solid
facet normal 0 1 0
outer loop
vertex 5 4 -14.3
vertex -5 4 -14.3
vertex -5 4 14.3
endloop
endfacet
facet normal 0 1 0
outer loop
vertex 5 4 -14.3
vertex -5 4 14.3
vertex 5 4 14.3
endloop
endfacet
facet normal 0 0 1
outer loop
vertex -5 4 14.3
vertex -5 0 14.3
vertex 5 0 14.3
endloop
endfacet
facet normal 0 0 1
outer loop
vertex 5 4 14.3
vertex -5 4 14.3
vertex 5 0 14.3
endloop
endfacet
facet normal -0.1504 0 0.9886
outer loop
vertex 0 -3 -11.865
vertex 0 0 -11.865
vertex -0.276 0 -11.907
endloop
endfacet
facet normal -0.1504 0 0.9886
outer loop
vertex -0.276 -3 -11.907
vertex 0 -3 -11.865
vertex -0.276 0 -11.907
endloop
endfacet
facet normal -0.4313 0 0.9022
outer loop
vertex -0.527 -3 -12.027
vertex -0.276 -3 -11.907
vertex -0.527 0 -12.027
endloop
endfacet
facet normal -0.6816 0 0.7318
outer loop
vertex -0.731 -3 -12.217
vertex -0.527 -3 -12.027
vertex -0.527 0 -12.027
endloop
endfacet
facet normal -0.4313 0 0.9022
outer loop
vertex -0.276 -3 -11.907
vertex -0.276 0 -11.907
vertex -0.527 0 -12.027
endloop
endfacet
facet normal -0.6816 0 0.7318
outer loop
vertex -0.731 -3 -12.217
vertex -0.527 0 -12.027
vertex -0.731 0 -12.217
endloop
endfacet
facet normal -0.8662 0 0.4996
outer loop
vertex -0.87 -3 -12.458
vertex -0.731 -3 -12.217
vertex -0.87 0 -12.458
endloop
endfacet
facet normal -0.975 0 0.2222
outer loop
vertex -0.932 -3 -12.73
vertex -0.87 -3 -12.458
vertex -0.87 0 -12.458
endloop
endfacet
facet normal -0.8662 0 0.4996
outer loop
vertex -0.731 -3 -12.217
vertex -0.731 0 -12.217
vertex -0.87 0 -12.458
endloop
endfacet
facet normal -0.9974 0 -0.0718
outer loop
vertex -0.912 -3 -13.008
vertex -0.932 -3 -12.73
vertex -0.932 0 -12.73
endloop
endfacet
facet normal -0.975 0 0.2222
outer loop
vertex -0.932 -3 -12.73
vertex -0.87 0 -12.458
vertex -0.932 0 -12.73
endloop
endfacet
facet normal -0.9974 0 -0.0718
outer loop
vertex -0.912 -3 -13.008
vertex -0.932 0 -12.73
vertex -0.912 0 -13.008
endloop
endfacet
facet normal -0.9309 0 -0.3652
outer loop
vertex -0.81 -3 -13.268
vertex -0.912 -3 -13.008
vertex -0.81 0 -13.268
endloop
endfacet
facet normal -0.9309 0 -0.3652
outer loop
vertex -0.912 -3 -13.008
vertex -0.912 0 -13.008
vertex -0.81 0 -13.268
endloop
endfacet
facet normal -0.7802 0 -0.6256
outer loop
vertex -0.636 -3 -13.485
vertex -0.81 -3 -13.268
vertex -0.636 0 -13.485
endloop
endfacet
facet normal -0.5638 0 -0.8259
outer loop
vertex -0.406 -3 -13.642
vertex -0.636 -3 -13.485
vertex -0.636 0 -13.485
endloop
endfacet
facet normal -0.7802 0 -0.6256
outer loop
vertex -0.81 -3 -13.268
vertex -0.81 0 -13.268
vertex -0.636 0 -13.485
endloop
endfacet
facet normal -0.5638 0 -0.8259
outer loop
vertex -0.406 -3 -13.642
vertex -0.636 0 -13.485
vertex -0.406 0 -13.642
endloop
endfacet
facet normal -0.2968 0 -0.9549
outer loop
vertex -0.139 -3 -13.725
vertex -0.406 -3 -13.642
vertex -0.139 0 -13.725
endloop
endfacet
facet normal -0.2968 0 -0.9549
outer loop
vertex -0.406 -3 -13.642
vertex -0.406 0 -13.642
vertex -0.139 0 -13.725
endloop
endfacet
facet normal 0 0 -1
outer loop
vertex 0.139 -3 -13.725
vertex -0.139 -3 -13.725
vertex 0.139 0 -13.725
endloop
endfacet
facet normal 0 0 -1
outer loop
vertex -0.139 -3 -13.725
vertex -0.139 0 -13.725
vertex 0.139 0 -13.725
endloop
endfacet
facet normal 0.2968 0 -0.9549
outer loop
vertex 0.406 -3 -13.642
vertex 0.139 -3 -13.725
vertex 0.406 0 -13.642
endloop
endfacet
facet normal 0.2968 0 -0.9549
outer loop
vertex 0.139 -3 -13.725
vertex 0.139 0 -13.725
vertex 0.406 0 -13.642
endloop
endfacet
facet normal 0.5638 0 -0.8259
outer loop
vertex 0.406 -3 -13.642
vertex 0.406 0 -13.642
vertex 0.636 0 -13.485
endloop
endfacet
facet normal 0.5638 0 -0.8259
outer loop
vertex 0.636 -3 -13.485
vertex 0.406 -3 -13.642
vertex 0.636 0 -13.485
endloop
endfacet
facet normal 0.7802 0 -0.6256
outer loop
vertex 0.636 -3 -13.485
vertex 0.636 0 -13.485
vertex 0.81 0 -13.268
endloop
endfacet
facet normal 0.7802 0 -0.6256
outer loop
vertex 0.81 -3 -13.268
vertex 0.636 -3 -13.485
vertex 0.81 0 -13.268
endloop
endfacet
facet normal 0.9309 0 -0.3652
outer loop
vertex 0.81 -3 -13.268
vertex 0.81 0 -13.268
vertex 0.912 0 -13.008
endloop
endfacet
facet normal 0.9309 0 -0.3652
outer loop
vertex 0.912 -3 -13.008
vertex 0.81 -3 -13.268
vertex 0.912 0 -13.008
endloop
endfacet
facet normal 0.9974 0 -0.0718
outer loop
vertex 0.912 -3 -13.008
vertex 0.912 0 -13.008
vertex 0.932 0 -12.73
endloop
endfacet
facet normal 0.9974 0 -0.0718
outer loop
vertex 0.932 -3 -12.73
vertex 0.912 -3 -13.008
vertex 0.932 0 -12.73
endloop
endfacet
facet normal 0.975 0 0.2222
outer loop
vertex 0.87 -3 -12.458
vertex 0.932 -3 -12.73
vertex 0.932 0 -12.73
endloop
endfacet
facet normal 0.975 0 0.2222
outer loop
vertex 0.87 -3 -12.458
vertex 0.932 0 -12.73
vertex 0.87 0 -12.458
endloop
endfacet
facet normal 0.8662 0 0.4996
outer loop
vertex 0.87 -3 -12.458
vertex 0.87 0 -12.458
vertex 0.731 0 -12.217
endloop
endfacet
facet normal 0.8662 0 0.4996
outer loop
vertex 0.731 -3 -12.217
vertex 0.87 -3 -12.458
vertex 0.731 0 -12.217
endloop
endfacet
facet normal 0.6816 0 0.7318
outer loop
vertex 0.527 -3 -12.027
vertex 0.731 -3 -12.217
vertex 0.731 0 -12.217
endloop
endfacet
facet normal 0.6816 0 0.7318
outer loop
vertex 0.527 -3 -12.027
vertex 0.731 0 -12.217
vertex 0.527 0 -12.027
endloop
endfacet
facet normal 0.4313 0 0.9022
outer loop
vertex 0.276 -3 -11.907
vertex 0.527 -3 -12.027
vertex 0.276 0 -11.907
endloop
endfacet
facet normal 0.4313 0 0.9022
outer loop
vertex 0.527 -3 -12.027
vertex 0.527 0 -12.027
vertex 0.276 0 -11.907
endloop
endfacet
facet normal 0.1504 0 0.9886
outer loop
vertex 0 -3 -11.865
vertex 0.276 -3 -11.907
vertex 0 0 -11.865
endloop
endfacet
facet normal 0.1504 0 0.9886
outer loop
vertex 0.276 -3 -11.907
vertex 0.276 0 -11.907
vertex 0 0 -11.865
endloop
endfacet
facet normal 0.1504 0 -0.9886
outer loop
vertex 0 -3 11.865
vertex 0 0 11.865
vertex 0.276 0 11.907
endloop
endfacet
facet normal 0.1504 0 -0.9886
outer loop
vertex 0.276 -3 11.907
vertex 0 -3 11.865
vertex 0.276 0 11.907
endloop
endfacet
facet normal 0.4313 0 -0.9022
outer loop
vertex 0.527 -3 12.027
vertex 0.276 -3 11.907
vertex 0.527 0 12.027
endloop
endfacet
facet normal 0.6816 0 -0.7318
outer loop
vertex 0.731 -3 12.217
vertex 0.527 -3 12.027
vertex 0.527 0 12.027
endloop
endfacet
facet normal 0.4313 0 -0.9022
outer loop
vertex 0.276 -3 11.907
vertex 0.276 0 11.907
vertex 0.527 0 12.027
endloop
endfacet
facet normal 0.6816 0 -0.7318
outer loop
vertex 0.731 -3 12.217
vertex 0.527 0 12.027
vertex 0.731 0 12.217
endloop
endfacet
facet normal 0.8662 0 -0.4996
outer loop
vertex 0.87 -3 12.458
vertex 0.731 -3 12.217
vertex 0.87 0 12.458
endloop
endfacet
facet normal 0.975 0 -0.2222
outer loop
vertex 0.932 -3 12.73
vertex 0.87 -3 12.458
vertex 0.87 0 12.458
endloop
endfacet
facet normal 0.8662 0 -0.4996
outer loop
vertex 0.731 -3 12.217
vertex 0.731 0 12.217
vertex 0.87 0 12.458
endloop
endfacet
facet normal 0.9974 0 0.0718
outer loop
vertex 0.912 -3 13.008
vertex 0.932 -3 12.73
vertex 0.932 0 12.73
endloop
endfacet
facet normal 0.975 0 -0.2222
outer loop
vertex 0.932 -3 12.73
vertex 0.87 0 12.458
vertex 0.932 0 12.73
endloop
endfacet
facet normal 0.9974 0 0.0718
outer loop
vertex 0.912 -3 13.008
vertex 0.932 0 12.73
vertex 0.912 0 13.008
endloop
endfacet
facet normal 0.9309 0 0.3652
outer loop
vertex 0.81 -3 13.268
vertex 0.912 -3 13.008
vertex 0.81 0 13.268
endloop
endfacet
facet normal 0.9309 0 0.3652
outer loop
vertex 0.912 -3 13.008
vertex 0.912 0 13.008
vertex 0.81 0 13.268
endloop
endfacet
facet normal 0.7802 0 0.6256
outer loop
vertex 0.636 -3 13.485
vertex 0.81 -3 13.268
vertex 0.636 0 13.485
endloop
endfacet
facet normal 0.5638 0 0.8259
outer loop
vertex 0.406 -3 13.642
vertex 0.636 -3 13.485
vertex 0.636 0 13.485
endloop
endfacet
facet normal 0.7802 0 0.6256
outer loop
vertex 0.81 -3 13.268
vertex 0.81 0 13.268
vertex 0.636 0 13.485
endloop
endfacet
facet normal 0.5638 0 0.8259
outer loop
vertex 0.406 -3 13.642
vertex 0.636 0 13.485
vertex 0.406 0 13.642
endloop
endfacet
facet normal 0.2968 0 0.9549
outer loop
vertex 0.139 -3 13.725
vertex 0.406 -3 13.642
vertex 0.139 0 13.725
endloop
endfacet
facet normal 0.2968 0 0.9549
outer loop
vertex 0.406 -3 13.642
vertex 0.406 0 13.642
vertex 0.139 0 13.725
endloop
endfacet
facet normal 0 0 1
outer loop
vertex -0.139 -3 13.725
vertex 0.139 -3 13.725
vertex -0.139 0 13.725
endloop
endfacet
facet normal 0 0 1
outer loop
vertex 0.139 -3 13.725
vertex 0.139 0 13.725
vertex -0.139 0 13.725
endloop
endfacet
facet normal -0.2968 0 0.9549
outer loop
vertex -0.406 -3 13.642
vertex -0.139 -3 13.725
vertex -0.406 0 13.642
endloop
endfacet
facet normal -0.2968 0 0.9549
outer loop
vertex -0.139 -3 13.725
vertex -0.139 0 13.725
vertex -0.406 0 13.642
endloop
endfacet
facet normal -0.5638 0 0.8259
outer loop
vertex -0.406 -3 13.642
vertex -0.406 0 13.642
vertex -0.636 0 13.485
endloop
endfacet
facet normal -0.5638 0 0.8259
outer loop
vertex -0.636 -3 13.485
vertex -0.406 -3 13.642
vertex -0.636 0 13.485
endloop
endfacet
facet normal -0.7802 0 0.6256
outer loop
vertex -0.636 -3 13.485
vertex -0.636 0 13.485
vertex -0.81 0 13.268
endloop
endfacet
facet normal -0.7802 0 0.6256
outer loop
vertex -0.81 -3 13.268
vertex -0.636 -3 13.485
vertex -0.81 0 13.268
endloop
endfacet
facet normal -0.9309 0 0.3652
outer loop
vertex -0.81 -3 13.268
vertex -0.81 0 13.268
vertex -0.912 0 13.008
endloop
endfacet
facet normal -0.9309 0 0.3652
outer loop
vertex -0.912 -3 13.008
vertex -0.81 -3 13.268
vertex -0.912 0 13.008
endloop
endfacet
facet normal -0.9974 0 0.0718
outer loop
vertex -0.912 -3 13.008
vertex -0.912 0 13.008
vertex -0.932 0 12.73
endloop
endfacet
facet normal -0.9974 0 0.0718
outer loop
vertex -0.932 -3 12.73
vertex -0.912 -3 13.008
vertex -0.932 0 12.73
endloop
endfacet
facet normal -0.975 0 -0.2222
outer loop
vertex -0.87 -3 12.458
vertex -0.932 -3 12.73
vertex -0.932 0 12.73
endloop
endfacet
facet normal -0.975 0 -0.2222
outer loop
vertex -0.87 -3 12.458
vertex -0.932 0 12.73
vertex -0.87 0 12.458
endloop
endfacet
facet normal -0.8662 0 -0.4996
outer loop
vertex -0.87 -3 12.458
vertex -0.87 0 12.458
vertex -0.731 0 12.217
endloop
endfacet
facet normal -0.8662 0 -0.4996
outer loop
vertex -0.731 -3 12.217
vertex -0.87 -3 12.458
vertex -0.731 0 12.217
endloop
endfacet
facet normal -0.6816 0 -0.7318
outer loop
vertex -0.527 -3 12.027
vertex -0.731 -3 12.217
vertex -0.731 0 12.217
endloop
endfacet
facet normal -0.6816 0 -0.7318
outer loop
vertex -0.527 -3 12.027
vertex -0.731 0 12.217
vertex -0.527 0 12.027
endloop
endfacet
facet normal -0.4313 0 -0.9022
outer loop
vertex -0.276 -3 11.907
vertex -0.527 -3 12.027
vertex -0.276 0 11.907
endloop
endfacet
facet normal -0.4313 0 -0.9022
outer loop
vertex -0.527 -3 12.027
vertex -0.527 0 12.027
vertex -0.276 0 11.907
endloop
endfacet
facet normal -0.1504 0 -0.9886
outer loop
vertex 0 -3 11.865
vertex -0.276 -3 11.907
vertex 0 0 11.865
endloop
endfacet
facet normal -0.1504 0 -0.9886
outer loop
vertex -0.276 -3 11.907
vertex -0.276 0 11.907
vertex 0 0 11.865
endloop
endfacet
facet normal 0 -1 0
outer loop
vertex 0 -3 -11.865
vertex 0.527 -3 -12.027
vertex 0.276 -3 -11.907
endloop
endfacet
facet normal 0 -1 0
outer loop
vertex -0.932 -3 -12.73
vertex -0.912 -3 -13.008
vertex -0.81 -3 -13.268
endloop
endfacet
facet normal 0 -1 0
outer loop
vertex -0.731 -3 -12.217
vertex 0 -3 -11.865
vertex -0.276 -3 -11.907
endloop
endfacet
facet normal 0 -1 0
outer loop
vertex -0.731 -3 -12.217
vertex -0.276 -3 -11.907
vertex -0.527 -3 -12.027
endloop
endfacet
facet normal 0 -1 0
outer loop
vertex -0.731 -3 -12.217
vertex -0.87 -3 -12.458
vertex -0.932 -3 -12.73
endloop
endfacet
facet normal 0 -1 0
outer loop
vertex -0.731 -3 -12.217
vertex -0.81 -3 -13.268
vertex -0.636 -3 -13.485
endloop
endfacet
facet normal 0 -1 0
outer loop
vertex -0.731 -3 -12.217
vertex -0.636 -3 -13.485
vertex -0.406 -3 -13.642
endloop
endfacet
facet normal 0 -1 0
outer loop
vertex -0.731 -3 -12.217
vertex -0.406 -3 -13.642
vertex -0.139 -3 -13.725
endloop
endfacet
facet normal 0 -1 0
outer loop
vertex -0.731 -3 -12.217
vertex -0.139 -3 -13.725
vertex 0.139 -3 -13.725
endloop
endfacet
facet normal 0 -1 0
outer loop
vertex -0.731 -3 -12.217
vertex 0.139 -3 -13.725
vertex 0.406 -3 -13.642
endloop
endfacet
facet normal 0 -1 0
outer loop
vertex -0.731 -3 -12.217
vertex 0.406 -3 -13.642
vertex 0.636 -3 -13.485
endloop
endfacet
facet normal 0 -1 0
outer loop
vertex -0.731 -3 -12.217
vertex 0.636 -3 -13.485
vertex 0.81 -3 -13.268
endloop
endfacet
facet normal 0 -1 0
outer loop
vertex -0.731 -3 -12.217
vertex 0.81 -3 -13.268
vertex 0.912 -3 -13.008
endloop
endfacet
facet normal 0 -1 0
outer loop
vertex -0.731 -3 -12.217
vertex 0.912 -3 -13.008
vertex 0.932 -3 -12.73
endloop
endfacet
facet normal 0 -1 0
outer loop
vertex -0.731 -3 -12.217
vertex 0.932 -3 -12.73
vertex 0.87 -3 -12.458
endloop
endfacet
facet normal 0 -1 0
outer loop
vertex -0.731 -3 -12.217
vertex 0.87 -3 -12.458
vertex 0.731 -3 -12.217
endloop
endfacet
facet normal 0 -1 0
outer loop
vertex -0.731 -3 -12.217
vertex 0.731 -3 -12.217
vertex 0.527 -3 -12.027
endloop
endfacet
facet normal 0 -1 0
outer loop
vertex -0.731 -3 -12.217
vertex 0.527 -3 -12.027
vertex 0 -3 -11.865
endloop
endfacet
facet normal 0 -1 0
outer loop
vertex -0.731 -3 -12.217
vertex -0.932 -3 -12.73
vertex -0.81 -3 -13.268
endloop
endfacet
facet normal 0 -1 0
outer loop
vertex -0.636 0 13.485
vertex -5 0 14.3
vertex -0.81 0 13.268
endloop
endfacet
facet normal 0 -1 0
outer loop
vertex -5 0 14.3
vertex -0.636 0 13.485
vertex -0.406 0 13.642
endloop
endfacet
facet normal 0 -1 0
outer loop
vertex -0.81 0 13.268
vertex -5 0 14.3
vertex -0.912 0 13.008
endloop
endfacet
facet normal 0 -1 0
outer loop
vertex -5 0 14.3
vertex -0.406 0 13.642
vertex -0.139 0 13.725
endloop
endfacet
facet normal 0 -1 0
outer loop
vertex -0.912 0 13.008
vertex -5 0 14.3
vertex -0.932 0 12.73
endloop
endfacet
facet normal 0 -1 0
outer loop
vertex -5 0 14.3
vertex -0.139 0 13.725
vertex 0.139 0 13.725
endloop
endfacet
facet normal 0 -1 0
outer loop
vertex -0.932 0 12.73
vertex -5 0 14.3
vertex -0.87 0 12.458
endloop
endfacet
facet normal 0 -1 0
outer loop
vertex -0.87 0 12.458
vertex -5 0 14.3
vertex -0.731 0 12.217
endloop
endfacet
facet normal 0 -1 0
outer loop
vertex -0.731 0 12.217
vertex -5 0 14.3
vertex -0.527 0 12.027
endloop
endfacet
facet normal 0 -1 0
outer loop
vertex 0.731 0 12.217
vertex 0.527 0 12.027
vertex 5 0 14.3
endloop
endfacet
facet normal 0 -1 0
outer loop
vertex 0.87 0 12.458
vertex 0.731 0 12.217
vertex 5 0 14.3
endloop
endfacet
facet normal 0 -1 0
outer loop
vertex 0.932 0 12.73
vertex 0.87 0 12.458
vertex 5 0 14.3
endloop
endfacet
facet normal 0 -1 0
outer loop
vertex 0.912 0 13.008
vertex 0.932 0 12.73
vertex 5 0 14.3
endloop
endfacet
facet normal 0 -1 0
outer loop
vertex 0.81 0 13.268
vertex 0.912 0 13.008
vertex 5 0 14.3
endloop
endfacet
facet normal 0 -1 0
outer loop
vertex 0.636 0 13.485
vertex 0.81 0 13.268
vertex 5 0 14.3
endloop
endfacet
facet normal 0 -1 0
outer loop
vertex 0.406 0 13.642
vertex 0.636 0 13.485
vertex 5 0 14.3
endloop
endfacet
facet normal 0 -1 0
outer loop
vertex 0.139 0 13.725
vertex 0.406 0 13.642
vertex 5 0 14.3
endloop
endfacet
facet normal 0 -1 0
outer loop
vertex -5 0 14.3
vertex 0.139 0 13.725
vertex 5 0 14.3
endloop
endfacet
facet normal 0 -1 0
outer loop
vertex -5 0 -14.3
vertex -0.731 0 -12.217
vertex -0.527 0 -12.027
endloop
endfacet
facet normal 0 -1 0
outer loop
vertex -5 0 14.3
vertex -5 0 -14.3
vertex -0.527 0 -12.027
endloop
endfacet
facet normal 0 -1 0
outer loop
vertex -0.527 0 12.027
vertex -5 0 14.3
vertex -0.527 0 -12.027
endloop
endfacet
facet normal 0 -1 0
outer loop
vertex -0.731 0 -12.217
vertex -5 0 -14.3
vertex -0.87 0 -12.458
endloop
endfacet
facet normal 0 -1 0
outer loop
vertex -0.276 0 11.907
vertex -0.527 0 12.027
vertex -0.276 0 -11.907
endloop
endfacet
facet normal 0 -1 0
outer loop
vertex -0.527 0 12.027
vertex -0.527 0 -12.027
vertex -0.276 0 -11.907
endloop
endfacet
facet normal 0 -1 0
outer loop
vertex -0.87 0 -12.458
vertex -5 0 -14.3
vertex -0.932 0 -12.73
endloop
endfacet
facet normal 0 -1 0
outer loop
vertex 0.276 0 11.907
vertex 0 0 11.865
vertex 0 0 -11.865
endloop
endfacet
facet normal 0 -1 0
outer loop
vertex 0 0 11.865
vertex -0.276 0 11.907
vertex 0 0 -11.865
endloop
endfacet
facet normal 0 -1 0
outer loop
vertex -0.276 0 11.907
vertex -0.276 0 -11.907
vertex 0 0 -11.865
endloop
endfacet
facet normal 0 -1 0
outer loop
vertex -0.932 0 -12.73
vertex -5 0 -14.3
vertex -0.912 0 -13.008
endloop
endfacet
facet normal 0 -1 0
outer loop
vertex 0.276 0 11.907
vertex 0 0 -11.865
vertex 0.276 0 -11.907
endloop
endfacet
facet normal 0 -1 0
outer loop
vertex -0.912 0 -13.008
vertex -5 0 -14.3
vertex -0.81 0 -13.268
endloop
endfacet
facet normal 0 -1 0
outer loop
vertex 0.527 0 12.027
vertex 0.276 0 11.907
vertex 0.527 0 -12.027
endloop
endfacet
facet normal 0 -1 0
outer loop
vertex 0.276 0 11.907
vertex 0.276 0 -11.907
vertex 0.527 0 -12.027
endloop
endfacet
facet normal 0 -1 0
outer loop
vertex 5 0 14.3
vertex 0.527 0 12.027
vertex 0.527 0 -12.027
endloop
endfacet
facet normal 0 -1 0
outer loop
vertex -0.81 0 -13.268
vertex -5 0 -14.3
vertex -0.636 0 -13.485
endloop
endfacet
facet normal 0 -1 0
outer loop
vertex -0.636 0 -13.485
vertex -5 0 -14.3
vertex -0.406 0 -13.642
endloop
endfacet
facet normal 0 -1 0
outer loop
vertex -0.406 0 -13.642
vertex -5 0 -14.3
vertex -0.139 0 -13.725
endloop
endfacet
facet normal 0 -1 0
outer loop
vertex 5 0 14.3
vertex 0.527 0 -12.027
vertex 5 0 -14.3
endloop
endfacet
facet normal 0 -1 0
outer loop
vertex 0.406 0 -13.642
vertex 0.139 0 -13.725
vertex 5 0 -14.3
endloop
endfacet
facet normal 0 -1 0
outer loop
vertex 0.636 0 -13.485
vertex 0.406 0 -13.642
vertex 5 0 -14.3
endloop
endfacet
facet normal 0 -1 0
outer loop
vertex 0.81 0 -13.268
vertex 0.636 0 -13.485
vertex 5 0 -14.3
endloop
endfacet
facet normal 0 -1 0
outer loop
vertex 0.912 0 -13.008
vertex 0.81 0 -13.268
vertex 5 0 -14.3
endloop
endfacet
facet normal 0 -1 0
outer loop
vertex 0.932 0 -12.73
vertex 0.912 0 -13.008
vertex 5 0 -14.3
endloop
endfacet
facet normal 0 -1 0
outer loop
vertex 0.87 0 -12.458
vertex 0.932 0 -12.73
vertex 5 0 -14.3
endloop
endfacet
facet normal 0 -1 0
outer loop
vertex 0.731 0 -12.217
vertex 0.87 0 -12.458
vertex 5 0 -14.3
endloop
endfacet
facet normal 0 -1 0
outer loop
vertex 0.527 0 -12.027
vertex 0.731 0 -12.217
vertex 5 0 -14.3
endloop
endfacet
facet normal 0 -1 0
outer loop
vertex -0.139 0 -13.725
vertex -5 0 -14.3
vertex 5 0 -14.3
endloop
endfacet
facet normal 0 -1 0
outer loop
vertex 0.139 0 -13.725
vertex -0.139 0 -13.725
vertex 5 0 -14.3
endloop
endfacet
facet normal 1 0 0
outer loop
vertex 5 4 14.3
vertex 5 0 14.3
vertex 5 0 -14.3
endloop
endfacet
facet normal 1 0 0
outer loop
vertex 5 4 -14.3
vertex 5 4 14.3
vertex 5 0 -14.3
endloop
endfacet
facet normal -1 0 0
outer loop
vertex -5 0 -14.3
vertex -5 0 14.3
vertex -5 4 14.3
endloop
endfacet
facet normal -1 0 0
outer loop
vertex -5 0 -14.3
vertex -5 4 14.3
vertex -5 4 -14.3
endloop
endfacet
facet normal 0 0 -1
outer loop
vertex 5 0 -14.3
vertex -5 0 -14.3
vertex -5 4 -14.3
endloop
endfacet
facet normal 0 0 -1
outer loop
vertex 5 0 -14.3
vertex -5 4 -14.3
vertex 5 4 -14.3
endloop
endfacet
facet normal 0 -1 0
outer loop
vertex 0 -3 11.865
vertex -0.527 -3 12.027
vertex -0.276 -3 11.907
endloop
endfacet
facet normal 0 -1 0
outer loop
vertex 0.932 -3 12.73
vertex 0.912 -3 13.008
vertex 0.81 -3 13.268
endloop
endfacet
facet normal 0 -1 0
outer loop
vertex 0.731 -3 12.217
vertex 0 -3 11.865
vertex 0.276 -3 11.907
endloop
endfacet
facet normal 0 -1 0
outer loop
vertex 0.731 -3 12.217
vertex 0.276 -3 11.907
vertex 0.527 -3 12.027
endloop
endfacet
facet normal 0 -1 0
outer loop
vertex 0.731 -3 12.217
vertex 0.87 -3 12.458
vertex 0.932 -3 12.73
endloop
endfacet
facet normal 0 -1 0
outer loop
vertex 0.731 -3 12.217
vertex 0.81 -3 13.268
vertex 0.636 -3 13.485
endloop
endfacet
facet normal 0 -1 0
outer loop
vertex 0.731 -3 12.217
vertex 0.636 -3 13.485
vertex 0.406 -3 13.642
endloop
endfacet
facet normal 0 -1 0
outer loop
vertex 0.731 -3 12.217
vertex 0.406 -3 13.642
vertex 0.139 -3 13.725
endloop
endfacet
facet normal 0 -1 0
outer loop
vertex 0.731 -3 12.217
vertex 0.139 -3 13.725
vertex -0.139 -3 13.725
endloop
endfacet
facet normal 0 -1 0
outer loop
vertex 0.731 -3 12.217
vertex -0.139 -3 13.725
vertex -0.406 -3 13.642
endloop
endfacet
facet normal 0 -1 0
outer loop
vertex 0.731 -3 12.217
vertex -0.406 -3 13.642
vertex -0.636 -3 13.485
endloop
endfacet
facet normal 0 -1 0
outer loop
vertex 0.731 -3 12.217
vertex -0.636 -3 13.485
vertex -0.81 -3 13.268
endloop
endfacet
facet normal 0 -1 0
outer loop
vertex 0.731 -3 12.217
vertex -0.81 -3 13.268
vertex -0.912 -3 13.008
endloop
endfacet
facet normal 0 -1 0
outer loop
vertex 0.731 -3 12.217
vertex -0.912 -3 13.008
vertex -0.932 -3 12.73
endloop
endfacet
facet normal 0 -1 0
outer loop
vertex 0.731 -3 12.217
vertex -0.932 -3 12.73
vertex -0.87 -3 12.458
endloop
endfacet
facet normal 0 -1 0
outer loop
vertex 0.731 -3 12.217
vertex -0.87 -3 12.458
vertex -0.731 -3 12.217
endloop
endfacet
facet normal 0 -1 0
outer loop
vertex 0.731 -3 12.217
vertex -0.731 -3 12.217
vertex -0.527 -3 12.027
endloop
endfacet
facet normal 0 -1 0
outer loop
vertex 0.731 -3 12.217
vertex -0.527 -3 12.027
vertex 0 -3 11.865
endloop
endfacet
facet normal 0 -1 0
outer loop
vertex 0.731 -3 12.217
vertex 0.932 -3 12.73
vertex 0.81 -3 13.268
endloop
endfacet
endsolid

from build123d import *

# Parameters (mm, degrees)
SKETCH1_W           = 10
SKETCH1_H           = 28.6
BOSS_EXTRUDE1_DEPTH = 4
SKETCH2_R           = 0.935
BOSS_EXTRUDE2_DEPTH = 3


with BuildPart() as part:
    # Sketch1 → Boss-Extrude1 (new body)
    with BuildSketch(Plane(origin=(0, 0, 0), x_dir=(1, 0, 0), z_dir=(0, 1, 0))):
        Rectangle(SKETCH1_W, SKETCH1_H)
    extrude(amount=BOSS_EXTRUDE1_DEPTH)

    # Sketch2 → Boss-Extrude2 (add)
    with BuildSketch(Plane.XZ):
        with Locations(Location((0, 12.8, 0), (0, 0, 270))):
            Circle(SKETCH2_R)
        with Locations(Location((0, -12.8, 0), (0, 0, 90))):
            Circle(SKETCH2_R)
    extrude(amount=BOSS_EXTRUDE2_DEPTH)


solid = part.part
